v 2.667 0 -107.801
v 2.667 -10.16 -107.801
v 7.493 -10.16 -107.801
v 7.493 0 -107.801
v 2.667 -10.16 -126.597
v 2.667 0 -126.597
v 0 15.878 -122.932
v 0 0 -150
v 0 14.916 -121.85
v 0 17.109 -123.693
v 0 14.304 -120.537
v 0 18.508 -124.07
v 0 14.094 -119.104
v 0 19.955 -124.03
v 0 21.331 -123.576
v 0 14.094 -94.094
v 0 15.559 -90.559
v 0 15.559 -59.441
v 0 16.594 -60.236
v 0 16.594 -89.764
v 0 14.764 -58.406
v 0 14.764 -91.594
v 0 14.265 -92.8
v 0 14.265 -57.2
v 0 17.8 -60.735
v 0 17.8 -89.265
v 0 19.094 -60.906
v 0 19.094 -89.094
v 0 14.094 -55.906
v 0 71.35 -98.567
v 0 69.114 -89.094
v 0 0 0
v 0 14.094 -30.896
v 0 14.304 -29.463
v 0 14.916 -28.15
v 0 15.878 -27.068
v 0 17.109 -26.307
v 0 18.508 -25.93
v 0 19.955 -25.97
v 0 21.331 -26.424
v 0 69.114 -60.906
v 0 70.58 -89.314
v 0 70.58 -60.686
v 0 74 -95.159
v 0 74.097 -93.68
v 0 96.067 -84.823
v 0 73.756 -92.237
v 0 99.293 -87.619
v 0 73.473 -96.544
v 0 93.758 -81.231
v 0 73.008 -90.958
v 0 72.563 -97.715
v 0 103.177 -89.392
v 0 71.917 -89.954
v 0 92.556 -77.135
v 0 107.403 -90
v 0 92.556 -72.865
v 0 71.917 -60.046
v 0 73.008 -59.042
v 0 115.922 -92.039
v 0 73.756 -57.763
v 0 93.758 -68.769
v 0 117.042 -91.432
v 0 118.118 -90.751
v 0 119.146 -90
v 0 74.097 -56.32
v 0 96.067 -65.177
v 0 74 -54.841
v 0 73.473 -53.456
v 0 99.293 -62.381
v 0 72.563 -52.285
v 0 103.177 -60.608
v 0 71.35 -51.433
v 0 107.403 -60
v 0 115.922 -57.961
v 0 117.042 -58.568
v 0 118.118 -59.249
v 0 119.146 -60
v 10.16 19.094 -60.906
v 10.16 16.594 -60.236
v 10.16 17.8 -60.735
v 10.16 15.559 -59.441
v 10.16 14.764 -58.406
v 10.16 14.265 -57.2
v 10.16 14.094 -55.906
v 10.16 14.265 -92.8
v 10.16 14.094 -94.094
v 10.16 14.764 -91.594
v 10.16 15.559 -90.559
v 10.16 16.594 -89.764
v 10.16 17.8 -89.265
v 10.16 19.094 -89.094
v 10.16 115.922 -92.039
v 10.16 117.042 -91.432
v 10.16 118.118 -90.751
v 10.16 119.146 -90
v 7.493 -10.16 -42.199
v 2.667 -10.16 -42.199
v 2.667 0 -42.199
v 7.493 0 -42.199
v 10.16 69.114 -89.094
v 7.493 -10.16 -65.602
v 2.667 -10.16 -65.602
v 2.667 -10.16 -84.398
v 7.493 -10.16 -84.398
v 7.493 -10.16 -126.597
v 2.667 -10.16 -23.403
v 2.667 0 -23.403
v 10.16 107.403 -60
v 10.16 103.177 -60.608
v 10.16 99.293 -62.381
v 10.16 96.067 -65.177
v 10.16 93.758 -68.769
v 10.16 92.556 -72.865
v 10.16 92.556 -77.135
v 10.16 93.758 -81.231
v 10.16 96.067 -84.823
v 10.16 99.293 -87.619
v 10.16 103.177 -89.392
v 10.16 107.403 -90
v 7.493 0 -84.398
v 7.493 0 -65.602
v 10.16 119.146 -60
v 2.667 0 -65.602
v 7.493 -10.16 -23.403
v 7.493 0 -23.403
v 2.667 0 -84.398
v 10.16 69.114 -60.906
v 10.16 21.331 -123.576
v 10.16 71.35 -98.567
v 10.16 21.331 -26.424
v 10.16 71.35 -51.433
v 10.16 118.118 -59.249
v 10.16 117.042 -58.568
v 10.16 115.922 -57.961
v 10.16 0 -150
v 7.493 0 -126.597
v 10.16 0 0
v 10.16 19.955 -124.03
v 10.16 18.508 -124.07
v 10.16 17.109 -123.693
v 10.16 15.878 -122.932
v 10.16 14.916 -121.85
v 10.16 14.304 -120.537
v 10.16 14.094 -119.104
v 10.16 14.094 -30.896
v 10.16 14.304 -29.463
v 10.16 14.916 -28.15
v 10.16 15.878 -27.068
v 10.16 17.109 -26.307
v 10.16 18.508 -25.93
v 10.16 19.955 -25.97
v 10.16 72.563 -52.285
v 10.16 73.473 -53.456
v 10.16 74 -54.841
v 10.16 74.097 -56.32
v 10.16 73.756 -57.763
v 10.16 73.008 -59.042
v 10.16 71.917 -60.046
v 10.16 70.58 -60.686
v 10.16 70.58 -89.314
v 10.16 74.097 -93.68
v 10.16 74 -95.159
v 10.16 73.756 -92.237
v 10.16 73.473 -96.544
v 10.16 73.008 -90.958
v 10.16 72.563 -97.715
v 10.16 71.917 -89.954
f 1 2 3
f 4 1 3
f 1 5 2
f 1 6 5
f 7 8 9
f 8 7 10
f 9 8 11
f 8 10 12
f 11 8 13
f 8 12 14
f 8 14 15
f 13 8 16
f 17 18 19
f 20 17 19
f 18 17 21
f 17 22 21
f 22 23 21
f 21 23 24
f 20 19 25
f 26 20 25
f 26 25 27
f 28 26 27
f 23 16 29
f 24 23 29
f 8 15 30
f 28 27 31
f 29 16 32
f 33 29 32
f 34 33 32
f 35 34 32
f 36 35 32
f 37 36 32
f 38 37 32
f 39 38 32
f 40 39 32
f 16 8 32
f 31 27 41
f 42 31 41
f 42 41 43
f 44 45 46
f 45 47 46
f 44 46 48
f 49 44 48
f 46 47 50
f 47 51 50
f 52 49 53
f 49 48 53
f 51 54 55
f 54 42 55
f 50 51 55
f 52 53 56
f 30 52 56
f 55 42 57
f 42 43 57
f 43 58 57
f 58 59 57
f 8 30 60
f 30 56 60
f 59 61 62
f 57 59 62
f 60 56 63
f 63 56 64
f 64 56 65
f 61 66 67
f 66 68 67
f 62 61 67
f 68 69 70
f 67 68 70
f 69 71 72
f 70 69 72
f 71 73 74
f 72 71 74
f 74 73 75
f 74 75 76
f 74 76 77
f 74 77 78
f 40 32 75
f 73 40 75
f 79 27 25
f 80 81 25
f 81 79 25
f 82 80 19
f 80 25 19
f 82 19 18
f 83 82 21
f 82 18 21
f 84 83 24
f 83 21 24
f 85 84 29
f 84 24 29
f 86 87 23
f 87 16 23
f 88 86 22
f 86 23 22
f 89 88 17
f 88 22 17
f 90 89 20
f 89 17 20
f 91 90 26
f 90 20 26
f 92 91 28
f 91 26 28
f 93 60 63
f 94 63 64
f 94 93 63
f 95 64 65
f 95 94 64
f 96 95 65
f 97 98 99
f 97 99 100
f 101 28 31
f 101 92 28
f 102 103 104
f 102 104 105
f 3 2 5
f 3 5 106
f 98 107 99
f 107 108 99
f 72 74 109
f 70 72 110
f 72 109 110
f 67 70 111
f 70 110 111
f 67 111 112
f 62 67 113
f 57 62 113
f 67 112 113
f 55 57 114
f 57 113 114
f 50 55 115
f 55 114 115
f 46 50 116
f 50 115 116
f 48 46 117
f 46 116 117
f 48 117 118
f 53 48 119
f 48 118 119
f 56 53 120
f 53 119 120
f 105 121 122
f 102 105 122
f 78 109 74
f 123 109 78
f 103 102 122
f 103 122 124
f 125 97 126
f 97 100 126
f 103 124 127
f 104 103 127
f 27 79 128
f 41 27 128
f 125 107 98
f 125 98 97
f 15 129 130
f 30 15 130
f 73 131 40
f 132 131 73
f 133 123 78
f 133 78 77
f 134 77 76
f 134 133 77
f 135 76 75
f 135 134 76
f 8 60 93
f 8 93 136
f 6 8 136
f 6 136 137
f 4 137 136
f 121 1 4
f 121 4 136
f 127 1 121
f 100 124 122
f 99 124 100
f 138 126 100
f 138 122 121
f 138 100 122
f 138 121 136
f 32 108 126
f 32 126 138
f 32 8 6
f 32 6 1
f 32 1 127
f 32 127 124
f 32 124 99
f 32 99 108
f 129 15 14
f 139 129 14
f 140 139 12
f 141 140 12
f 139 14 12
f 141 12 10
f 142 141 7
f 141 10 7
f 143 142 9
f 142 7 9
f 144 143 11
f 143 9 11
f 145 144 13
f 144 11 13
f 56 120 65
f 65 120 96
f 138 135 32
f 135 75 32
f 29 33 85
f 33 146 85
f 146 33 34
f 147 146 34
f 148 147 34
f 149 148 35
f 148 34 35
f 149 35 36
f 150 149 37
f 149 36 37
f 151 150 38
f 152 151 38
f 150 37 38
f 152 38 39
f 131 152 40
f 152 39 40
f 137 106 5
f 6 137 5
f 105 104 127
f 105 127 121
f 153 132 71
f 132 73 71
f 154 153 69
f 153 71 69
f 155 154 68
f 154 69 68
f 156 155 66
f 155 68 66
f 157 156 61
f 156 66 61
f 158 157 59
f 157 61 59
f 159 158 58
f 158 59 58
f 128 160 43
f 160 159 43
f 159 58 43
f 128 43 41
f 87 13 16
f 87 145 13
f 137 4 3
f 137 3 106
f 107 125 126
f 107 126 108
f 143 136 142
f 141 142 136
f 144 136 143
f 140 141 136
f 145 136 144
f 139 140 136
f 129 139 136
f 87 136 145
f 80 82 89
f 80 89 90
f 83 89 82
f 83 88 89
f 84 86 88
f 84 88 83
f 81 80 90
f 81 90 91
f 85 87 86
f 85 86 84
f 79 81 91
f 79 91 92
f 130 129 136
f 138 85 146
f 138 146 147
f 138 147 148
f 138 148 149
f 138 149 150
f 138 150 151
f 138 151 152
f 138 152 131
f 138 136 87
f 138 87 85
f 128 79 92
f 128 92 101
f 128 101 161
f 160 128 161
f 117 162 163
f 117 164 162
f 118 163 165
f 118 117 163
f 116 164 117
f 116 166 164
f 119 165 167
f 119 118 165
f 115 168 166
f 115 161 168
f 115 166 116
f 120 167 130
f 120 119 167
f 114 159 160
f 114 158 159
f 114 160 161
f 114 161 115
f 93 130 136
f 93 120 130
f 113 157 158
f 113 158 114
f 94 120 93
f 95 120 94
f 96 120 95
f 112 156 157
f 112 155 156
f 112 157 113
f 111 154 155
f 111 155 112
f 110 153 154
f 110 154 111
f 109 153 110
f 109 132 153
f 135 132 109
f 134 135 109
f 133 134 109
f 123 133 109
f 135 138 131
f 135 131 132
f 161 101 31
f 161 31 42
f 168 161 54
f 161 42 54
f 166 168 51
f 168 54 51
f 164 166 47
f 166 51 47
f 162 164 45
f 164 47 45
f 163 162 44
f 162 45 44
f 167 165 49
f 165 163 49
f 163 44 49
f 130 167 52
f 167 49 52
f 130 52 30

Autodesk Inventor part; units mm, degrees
ref_plane "YZ Plane" through (0, 0, 0) normal (1, 0, 0) x (0, 1, 0)
ref_plane "XZ Plane" through (0, 0, 0) normal (0, 1, 0) x (-1, 0, 0)
ref_plane "XY Plane" through (0, 0, 0) normal (0, 0, 1) x (1, 0, 0)
sketch "Sketch1" plane through (0, 0, 0) normal (1, 0, 0) x (0, 1, 0)
  line L0 (150, -75) -> (0, 0)
  line L1 (150, -75) -> (0, -150)
  line L2 (0, -150) -> (0, 0)
  dimension "d0" = 150
  dimension "d1" = 75
extrude "Extrusion1" add sketch "Sketch1" along normal blind 10.16
sketch "Sketch2" plane through (10.16, 0, 0) normal (1, 0, 0) x (0, 0, -1)
  point P0 (0, 0)
fillet "Fillet1" radius 19.05 1 edges at (5.08, 150, -75)
sketch "Sketch3" plane through (10.16, 0, 0) normal (1, 0, 0) x (0, 0, -1)
  arc A0 (92.0388, 115.9223) -> (57.9612, 115.9223) centre (75, 107.4029) ccw projected
  circle A1 centre (75, 107.4029) radius 15
  circle A2 centre (75, 107.4029) radius 10
  line L0 (75, 122.4029) -> (75, 117.4029)
  line L1 (75, 97.4029) -> (75, 92.4029)
  line L2 (85.6066, 118.0095) -> (82.0711, 114.474)
  line L3 (67.9289, 100.3318) -> (64.3934, 96.7963)
  point P0 (0, 0)
  dimension "d5" = 30
  dimension "d34" = 20
  dimension "d35" = 45
  dimension "d36" = 45
sketch "Sketch4" plane through (10.16, 0, 0) normal (1, 0, 0) x (0, 0, -1)
  line L0 (22.8055, 14.0945) -> (60.9055, 90.2945)
  line L1 (57.9612, 115.9223) -> (0, 0) projected
  line L2 (22.8055, 14.0945) -> (60.9055, 14.0945)
  line L3 (60.9055, 14.0945) -> (60.9055, 90.2945)
  line L4 (0, 0) -> (150, 0) construction
  line L5 (0, 0) -> (150, 0) construction
  arc A0 (92.0388, 115.9223) -> (57.9612, 115.9223) centre (75, 107.4029) ccw construction
  line L6 (75, 126.4529) -> (75, 0) construction
  line L7 (127.1945, 14.0945) -> (89.0945, 90.2945)
  line L8 (127.1945, 14.0945) -> (89.0945, 14.0945)
  line L9 (89.0945, 14.0945) -> (89.0945, 90.2945)
  dimension "d8" = 76.2
  dimension "d11" = 14.0945
  dimension "d12" = 14.0945
  dimension "d13" = 14.0945
extrude "Extrusion3" cut sketch "Sketch4" against normal through all
fillet "Fillet2" radius 5 1 edges at (5.08, 14.0945, -127.1945)
fillet "Fillet3" radius 5 2 edges at (5.08, 14.0945, -89.0945) (5.08, 90.2945, -89.0945)
fillet "Fillet4" radius 5 3 edges at (5.08, 14.0945, -60.9055) (5.08, 90.2945, -60.9055) (5.08, 14.0945, -22.8055)
sketch "Sketch6" plane through (0, 0, -150) normal (0, -1, 0) x (1, 0, 0)
  line L0 (10.16, 150) -> (10.16, 0) construction
  line L1 (10.16, 75) -> (0, 75) construction
  line L2 (0, 65) -> (0, 85) construction
  line L3 (7.493, 126.597) -> (2.667, 126.597)
  line L4 (2.667, 126.597) -> (2.667, 107.801)
  line L5 (2.667, 107.801) -> (7.493, 107.801)
  line L6 (7.493, 107.801) -> (7.493, 126.597)
  line L7 (0, 150) -> (0, 0) projected
  line L8 (0, 150) -> (10.16, 150) projected
  line L9 (7.493, 84.398) -> (2.667, 84.398)
  line L10 (2.667, 84.398) -> (2.667, 65.602)
  line L11 (2.667, 65.602) -> (7.493, 65.602)
  line L12 (7.493, 65.602) -> (7.493, 84.398)
  line L13 (7.493, 23.403) -> (2.667, 23.403)
  line L14 (2.667, 23.403) -> (2.667, 42.199)
  line L15 (2.667, 42.199) -> (7.493, 42.199)
  line L16 (7.493, 42.199) -> (7.493, 23.403)
  dimension "d22" = 4.826
  dimension "d23" = 2.667
  dimension "d24" = 2.667
  dimension "d25" = 18.796
  dimension "d26" = 23.403
  dimension "d27" = 18.796
  dimension "d29" = 4.826
  dimension "d30" = 2.667
  dimension "d31" = 2.667
  dimension "d41" = 23.403
extrude "Extrusion5" add sketch "Sketch6" along normal blind 10.16
extrude "Extrusion7" cut sketch "Sketch3" against normal through all
sketch "Sketch7" plane through (10.16, 0, 0) normal (1, 0, 0) x (0, 0, -1)
  circle A0 centre (75, 107.4029) radius 15 projected
  line L0 (60, 107.4029) -> (60, 119.1461)
  arc A1 (92.0388, 115.9223) -> (57.9612, 115.9223) centre (75, 107.4029) ccw projected
  line L1 (90, 107.4029) -> (90, 119.1461)
  arc A2 (90, 107.4029) -> (60, 107.4029) centre (75, 107.4029) ccw
  arc A3 (90, 119.1461) -> (60, 119.1461) centre (75, 107.4029) ccw
  point P0 (0, 0)
extrude "Extrusion8" cut sketch "Sketch7" against normal through all contours A0 L0 A1 L1
equation "\"d11\" = d13"
equation "\"d12\" = d11"
equation "\"d23\" = d24"
equation "\"d26\" = d41"
equation "\"d27\" = d25"
equation "\"d29\" = d22"
equation "\"d30\" = d23"
properties part number "spool holder arm side1" material "PLA"
